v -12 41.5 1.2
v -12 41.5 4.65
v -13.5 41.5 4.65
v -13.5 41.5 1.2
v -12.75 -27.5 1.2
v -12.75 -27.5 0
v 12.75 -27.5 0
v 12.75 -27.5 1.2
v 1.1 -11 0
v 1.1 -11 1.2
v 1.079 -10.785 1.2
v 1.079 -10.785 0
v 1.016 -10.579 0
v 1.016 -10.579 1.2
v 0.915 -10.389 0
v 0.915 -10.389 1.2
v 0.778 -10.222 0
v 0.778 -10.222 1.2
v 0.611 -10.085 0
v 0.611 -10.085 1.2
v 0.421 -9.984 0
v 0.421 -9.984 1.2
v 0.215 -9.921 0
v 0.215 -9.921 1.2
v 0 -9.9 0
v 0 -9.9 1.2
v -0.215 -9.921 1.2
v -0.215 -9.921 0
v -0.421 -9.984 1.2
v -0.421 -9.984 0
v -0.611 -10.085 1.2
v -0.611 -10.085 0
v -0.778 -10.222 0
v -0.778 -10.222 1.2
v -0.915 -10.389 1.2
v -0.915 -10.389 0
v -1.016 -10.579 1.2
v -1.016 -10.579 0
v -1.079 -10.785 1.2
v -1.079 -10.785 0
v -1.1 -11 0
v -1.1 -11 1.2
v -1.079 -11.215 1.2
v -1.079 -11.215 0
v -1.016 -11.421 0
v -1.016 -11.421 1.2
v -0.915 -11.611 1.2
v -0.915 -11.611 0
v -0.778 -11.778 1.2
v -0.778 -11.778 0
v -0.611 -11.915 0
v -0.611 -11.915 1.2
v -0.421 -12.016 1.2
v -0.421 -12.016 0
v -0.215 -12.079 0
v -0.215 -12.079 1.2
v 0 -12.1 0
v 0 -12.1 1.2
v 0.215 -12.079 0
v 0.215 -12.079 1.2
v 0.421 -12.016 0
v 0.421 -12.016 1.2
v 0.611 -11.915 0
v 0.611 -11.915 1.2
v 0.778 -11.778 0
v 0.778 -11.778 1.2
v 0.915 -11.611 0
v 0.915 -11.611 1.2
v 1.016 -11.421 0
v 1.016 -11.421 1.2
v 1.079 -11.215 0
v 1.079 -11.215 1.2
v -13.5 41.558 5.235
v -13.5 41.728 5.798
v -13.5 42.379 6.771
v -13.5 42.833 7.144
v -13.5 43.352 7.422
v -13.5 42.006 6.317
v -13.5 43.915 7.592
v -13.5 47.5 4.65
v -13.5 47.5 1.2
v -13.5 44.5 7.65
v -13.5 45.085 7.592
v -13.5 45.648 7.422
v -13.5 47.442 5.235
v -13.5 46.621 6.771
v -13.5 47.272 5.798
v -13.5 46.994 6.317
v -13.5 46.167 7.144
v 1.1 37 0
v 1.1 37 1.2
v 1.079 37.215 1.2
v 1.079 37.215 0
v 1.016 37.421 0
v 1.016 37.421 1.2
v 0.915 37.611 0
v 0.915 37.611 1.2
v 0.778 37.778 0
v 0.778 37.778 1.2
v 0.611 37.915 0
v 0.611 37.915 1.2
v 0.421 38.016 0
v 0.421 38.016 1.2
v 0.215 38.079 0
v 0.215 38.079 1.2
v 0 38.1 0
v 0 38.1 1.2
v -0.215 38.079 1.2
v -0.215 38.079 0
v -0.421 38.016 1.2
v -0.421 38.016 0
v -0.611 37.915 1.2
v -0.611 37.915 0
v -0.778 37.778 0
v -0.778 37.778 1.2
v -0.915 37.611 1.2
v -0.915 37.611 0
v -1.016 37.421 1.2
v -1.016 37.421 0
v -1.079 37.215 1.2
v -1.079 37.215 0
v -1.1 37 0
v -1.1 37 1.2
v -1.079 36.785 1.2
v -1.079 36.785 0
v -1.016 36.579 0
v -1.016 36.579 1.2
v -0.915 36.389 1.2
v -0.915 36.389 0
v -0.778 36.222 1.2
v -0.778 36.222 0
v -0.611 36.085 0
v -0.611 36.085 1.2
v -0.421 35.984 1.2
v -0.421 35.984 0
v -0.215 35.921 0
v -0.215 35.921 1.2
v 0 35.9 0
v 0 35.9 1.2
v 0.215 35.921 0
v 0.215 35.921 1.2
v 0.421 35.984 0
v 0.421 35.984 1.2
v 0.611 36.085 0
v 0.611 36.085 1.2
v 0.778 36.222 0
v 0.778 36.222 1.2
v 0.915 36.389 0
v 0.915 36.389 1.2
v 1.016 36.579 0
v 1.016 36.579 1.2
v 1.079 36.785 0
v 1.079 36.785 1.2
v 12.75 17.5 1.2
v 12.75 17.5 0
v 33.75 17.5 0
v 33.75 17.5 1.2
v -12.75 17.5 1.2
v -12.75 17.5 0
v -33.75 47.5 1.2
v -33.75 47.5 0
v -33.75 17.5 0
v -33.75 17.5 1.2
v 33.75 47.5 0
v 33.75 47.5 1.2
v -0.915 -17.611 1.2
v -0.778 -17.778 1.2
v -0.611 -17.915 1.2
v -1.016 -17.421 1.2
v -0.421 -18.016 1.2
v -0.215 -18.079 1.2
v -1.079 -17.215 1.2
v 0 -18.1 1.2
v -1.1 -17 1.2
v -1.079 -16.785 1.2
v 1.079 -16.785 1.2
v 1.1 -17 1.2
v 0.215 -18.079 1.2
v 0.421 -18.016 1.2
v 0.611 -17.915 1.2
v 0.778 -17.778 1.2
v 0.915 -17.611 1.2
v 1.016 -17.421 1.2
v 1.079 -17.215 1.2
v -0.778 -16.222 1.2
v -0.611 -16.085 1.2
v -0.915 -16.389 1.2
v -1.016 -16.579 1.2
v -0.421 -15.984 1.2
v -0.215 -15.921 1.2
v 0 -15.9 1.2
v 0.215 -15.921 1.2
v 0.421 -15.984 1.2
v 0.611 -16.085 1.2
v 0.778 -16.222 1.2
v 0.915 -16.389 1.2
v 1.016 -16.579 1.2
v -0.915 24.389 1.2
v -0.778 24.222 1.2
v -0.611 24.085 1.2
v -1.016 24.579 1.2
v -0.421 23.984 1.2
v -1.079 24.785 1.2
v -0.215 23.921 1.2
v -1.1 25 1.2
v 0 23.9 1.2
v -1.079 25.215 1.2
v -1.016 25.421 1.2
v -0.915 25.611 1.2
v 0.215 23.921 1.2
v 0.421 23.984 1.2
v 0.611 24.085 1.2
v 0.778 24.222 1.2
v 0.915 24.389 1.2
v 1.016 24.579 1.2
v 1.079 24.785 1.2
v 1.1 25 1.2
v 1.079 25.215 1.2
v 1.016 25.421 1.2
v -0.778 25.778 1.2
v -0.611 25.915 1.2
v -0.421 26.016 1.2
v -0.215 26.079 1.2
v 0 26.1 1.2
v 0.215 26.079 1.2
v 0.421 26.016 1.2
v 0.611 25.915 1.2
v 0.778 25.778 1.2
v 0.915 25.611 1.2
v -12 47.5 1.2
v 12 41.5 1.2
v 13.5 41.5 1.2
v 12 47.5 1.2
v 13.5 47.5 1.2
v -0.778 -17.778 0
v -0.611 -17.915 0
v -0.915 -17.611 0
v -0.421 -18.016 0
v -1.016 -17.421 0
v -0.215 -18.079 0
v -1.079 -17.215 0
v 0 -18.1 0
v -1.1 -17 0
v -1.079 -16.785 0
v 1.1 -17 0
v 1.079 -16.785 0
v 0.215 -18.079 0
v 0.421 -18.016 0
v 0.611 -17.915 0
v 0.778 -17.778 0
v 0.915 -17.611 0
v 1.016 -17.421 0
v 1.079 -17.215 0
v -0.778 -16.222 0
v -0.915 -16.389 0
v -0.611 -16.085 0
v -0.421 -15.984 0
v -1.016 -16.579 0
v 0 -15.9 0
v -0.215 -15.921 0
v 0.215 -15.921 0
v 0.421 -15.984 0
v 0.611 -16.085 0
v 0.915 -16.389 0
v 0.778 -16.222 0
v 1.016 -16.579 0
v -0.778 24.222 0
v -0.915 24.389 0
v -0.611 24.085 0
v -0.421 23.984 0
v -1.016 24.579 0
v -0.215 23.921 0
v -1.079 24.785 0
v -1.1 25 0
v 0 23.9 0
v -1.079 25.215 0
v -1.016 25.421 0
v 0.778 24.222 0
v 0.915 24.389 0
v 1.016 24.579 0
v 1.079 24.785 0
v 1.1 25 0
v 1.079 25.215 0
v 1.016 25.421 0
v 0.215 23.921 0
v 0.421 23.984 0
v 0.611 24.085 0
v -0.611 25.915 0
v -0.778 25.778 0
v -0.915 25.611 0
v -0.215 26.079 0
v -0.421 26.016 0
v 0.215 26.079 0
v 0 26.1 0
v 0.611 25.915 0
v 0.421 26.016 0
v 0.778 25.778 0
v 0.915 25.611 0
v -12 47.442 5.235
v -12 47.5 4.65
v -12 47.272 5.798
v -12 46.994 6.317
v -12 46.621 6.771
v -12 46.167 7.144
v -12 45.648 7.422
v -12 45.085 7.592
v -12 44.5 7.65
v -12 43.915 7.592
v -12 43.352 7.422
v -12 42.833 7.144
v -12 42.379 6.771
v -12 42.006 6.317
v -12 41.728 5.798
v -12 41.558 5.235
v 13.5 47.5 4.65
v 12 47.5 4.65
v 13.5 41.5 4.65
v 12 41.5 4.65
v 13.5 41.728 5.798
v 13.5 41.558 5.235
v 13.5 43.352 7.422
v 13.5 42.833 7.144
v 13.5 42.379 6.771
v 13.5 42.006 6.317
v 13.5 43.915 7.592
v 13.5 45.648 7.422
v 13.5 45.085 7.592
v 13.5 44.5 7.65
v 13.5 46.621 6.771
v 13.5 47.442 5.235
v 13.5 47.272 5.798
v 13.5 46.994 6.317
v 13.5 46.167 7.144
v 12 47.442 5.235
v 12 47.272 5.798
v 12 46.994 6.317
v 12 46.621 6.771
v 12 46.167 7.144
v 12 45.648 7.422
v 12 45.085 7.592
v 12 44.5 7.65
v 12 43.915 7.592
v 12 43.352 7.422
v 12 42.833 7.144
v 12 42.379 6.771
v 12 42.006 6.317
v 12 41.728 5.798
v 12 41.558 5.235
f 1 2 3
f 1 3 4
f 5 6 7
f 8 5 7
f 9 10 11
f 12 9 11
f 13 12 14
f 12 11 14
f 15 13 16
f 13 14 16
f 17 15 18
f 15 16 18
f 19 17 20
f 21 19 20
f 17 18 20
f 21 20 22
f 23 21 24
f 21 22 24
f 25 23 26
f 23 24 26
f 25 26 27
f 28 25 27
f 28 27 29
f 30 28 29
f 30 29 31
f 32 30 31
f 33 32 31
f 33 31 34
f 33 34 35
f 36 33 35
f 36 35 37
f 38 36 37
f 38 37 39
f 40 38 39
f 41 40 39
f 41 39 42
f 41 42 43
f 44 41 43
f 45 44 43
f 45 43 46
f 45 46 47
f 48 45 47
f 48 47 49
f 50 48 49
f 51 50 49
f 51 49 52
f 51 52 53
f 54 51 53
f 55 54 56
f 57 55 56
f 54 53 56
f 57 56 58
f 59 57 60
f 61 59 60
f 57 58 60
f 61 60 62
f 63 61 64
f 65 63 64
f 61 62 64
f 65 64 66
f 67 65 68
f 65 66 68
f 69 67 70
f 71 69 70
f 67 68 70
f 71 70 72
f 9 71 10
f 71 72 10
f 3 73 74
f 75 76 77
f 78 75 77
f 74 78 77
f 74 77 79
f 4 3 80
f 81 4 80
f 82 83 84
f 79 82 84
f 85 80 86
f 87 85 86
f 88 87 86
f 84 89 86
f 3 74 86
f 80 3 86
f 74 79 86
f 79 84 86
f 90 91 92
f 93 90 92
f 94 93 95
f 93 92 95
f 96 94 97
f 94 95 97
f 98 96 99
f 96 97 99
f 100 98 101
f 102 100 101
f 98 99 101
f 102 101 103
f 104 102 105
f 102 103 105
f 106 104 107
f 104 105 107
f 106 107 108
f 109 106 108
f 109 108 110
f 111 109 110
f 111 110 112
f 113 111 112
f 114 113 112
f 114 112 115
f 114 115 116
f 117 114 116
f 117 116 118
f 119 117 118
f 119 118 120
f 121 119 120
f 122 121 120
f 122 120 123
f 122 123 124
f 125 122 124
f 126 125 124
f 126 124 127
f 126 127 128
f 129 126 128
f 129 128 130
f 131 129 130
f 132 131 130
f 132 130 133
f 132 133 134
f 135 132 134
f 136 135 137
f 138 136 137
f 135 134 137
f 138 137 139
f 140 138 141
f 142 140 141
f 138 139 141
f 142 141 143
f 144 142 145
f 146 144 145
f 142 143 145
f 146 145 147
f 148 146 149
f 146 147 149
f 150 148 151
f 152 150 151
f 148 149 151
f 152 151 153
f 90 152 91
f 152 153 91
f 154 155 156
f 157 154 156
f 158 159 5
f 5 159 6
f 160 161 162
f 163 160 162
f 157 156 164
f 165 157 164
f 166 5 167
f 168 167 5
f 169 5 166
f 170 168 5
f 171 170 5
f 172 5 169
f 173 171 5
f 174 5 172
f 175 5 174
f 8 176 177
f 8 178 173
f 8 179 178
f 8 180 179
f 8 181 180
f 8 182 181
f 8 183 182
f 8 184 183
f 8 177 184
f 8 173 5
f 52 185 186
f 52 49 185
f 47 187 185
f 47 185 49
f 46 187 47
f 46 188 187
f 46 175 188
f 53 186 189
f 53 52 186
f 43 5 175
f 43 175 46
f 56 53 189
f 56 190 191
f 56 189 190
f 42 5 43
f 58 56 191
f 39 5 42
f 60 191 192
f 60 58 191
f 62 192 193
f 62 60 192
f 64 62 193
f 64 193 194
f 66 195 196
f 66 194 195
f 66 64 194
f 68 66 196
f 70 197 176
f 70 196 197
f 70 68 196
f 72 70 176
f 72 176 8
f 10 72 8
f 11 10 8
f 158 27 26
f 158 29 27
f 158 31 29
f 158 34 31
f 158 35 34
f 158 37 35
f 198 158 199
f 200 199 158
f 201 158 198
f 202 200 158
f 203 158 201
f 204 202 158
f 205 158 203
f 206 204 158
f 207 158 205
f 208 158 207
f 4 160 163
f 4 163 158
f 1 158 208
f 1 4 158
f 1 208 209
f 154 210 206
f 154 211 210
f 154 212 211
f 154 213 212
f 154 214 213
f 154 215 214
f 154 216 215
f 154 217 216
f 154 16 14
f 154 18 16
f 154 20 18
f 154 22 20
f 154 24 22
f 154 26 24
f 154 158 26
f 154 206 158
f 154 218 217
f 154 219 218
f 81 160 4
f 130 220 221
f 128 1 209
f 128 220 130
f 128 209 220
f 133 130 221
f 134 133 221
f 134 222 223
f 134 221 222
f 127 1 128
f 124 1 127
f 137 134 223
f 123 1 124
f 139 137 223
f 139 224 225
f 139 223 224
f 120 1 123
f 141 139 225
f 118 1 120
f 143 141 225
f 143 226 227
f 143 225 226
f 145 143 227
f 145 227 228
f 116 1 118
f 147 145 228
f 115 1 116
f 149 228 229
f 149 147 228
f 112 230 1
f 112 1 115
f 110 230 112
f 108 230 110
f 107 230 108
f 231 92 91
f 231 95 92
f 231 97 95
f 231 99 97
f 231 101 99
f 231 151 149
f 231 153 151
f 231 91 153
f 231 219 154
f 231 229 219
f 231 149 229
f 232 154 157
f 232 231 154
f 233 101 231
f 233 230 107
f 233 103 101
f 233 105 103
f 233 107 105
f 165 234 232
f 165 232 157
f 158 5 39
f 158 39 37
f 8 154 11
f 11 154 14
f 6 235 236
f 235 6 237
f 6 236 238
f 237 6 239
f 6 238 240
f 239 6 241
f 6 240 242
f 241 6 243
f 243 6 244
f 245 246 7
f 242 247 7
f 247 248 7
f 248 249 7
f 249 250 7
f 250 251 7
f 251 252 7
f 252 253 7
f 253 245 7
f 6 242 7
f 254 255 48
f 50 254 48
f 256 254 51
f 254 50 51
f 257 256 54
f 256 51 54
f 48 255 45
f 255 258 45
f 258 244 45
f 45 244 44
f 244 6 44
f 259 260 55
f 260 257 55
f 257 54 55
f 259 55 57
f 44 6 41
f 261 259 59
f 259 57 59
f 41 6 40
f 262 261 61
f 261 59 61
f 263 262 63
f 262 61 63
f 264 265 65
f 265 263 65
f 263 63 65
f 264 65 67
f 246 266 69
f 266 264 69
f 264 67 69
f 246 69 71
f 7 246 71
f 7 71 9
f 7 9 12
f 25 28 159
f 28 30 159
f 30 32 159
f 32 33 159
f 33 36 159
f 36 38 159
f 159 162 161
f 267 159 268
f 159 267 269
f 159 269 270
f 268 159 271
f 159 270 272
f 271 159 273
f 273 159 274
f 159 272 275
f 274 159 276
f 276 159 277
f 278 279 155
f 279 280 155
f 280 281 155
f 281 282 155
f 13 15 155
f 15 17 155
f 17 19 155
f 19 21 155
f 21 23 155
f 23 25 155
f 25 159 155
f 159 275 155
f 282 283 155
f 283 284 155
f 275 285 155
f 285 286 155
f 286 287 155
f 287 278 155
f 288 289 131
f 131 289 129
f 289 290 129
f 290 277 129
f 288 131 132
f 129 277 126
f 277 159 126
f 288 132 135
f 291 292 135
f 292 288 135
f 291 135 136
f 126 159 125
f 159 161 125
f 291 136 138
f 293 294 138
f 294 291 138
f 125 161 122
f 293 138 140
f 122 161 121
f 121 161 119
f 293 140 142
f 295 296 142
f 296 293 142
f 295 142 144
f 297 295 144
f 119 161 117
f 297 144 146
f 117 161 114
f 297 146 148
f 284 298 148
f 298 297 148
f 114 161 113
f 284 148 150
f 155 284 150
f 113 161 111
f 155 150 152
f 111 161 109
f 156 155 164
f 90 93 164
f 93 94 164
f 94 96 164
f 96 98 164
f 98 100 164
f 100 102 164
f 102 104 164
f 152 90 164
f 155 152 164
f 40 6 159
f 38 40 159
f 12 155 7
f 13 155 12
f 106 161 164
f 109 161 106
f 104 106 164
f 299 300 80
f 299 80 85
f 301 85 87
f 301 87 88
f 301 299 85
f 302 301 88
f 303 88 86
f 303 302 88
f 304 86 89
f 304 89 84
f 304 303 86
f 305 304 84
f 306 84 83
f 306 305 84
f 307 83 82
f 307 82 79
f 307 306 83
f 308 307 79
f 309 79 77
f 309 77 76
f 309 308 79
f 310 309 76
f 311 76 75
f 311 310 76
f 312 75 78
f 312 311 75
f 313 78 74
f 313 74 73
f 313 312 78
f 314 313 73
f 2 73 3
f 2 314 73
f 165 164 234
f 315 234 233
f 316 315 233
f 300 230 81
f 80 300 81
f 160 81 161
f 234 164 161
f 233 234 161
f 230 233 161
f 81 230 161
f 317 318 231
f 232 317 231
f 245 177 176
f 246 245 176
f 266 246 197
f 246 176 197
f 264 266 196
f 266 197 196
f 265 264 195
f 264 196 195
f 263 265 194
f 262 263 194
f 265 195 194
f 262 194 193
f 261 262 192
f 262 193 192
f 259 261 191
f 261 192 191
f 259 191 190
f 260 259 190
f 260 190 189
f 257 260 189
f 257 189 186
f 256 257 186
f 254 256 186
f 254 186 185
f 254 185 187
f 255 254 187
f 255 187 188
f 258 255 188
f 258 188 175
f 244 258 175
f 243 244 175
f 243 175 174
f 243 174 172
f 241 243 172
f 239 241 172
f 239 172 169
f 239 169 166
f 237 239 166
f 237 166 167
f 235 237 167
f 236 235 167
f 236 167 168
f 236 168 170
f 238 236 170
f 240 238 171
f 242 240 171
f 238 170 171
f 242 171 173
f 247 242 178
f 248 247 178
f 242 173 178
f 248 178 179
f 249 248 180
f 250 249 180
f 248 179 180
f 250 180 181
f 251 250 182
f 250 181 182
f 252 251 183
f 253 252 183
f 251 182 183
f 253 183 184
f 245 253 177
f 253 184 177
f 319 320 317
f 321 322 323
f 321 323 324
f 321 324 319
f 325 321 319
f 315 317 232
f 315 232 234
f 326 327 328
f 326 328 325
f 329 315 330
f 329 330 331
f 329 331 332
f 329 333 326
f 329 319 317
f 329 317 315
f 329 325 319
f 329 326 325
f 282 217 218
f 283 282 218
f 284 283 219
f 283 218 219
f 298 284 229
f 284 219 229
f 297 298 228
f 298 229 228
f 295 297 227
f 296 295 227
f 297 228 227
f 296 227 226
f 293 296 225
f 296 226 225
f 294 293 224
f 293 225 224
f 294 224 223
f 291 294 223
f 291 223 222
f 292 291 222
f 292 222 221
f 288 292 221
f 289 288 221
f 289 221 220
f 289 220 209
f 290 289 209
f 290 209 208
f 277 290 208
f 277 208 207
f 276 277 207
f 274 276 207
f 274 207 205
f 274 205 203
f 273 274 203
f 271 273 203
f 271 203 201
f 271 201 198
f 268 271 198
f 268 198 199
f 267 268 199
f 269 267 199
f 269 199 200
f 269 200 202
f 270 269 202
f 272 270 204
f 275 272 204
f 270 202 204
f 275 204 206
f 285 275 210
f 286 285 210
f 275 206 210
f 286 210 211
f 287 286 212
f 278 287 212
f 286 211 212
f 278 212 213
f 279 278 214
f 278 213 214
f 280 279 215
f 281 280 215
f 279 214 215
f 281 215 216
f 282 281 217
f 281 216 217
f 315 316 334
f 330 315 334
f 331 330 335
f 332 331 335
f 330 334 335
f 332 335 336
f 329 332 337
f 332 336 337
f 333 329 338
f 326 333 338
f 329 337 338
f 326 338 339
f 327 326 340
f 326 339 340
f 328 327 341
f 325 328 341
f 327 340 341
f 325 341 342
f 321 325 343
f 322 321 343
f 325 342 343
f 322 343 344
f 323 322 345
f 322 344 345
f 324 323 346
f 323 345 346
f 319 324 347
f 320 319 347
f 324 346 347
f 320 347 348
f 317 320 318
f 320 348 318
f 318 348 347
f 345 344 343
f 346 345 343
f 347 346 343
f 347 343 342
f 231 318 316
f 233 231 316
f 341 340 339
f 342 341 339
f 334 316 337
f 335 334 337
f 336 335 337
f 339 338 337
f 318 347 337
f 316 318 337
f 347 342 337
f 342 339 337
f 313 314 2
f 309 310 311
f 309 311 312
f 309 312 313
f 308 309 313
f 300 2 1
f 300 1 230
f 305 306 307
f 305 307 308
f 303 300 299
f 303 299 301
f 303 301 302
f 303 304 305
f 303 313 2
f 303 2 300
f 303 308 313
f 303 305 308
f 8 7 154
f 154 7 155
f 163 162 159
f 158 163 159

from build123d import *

# Parameters (mm, degrees)
F2_DEPTH = 1.2
F5_DEPTH = 1.5
F7_R     = 1.1
F8_DEPTH = 1.201


with BuildPart() as f2:
    # F1 (on Top) → F2 (new body)
    with BuildSketch(Plane.XY):
        Polygon((-12.75, 17.5), (-12.75, -27.5), (12.75, -27.5), (12.75, 17.5), (33.75, 17.5), (33.75, 47.5), (-33.75, 47.5), (-33.75, 17.5), align=None)
    extrude(amount=F2_DEPTH)

    # F4 (on offset) → F5 (join)
    with BuildSketch(Plane.YZ.offset(12)):
        with BuildLine():
            Line((41.5, 4.65), (41.5, 1.2))
            Line((41.5, 1.2), (47.5, 1.2))
            Line((47.5, 1.2), (47.5, 4.65))
            ThreePointArc((47.5, 4.65), (44.5, 7.65), (41.5, 4.65))
        make_face()
    extrude(amount=F5_DEPTH)

    # F6: F2 across plane


with BuildPart() as f2_1:
    add(f2.part)
    add(f2.part.mirror(Plane.YZ))

    # F7 (on face) → F8 (cut, through all)
    with BuildSketch(Plane.XY.offset(1.2)):
        with Locations((0, 37)):
            Circle(F7_R)
        with Locations((0, 25)):
            Circle(F7_R)
        with Locations((0, -11)):
            Circle(F7_R)
        with Locations((0, -17)):
            Circle(F7_R)
    extrude(amount=-F8_DEPTH, mode=Mode.SUBTRACT)


solid = f2_1.part
